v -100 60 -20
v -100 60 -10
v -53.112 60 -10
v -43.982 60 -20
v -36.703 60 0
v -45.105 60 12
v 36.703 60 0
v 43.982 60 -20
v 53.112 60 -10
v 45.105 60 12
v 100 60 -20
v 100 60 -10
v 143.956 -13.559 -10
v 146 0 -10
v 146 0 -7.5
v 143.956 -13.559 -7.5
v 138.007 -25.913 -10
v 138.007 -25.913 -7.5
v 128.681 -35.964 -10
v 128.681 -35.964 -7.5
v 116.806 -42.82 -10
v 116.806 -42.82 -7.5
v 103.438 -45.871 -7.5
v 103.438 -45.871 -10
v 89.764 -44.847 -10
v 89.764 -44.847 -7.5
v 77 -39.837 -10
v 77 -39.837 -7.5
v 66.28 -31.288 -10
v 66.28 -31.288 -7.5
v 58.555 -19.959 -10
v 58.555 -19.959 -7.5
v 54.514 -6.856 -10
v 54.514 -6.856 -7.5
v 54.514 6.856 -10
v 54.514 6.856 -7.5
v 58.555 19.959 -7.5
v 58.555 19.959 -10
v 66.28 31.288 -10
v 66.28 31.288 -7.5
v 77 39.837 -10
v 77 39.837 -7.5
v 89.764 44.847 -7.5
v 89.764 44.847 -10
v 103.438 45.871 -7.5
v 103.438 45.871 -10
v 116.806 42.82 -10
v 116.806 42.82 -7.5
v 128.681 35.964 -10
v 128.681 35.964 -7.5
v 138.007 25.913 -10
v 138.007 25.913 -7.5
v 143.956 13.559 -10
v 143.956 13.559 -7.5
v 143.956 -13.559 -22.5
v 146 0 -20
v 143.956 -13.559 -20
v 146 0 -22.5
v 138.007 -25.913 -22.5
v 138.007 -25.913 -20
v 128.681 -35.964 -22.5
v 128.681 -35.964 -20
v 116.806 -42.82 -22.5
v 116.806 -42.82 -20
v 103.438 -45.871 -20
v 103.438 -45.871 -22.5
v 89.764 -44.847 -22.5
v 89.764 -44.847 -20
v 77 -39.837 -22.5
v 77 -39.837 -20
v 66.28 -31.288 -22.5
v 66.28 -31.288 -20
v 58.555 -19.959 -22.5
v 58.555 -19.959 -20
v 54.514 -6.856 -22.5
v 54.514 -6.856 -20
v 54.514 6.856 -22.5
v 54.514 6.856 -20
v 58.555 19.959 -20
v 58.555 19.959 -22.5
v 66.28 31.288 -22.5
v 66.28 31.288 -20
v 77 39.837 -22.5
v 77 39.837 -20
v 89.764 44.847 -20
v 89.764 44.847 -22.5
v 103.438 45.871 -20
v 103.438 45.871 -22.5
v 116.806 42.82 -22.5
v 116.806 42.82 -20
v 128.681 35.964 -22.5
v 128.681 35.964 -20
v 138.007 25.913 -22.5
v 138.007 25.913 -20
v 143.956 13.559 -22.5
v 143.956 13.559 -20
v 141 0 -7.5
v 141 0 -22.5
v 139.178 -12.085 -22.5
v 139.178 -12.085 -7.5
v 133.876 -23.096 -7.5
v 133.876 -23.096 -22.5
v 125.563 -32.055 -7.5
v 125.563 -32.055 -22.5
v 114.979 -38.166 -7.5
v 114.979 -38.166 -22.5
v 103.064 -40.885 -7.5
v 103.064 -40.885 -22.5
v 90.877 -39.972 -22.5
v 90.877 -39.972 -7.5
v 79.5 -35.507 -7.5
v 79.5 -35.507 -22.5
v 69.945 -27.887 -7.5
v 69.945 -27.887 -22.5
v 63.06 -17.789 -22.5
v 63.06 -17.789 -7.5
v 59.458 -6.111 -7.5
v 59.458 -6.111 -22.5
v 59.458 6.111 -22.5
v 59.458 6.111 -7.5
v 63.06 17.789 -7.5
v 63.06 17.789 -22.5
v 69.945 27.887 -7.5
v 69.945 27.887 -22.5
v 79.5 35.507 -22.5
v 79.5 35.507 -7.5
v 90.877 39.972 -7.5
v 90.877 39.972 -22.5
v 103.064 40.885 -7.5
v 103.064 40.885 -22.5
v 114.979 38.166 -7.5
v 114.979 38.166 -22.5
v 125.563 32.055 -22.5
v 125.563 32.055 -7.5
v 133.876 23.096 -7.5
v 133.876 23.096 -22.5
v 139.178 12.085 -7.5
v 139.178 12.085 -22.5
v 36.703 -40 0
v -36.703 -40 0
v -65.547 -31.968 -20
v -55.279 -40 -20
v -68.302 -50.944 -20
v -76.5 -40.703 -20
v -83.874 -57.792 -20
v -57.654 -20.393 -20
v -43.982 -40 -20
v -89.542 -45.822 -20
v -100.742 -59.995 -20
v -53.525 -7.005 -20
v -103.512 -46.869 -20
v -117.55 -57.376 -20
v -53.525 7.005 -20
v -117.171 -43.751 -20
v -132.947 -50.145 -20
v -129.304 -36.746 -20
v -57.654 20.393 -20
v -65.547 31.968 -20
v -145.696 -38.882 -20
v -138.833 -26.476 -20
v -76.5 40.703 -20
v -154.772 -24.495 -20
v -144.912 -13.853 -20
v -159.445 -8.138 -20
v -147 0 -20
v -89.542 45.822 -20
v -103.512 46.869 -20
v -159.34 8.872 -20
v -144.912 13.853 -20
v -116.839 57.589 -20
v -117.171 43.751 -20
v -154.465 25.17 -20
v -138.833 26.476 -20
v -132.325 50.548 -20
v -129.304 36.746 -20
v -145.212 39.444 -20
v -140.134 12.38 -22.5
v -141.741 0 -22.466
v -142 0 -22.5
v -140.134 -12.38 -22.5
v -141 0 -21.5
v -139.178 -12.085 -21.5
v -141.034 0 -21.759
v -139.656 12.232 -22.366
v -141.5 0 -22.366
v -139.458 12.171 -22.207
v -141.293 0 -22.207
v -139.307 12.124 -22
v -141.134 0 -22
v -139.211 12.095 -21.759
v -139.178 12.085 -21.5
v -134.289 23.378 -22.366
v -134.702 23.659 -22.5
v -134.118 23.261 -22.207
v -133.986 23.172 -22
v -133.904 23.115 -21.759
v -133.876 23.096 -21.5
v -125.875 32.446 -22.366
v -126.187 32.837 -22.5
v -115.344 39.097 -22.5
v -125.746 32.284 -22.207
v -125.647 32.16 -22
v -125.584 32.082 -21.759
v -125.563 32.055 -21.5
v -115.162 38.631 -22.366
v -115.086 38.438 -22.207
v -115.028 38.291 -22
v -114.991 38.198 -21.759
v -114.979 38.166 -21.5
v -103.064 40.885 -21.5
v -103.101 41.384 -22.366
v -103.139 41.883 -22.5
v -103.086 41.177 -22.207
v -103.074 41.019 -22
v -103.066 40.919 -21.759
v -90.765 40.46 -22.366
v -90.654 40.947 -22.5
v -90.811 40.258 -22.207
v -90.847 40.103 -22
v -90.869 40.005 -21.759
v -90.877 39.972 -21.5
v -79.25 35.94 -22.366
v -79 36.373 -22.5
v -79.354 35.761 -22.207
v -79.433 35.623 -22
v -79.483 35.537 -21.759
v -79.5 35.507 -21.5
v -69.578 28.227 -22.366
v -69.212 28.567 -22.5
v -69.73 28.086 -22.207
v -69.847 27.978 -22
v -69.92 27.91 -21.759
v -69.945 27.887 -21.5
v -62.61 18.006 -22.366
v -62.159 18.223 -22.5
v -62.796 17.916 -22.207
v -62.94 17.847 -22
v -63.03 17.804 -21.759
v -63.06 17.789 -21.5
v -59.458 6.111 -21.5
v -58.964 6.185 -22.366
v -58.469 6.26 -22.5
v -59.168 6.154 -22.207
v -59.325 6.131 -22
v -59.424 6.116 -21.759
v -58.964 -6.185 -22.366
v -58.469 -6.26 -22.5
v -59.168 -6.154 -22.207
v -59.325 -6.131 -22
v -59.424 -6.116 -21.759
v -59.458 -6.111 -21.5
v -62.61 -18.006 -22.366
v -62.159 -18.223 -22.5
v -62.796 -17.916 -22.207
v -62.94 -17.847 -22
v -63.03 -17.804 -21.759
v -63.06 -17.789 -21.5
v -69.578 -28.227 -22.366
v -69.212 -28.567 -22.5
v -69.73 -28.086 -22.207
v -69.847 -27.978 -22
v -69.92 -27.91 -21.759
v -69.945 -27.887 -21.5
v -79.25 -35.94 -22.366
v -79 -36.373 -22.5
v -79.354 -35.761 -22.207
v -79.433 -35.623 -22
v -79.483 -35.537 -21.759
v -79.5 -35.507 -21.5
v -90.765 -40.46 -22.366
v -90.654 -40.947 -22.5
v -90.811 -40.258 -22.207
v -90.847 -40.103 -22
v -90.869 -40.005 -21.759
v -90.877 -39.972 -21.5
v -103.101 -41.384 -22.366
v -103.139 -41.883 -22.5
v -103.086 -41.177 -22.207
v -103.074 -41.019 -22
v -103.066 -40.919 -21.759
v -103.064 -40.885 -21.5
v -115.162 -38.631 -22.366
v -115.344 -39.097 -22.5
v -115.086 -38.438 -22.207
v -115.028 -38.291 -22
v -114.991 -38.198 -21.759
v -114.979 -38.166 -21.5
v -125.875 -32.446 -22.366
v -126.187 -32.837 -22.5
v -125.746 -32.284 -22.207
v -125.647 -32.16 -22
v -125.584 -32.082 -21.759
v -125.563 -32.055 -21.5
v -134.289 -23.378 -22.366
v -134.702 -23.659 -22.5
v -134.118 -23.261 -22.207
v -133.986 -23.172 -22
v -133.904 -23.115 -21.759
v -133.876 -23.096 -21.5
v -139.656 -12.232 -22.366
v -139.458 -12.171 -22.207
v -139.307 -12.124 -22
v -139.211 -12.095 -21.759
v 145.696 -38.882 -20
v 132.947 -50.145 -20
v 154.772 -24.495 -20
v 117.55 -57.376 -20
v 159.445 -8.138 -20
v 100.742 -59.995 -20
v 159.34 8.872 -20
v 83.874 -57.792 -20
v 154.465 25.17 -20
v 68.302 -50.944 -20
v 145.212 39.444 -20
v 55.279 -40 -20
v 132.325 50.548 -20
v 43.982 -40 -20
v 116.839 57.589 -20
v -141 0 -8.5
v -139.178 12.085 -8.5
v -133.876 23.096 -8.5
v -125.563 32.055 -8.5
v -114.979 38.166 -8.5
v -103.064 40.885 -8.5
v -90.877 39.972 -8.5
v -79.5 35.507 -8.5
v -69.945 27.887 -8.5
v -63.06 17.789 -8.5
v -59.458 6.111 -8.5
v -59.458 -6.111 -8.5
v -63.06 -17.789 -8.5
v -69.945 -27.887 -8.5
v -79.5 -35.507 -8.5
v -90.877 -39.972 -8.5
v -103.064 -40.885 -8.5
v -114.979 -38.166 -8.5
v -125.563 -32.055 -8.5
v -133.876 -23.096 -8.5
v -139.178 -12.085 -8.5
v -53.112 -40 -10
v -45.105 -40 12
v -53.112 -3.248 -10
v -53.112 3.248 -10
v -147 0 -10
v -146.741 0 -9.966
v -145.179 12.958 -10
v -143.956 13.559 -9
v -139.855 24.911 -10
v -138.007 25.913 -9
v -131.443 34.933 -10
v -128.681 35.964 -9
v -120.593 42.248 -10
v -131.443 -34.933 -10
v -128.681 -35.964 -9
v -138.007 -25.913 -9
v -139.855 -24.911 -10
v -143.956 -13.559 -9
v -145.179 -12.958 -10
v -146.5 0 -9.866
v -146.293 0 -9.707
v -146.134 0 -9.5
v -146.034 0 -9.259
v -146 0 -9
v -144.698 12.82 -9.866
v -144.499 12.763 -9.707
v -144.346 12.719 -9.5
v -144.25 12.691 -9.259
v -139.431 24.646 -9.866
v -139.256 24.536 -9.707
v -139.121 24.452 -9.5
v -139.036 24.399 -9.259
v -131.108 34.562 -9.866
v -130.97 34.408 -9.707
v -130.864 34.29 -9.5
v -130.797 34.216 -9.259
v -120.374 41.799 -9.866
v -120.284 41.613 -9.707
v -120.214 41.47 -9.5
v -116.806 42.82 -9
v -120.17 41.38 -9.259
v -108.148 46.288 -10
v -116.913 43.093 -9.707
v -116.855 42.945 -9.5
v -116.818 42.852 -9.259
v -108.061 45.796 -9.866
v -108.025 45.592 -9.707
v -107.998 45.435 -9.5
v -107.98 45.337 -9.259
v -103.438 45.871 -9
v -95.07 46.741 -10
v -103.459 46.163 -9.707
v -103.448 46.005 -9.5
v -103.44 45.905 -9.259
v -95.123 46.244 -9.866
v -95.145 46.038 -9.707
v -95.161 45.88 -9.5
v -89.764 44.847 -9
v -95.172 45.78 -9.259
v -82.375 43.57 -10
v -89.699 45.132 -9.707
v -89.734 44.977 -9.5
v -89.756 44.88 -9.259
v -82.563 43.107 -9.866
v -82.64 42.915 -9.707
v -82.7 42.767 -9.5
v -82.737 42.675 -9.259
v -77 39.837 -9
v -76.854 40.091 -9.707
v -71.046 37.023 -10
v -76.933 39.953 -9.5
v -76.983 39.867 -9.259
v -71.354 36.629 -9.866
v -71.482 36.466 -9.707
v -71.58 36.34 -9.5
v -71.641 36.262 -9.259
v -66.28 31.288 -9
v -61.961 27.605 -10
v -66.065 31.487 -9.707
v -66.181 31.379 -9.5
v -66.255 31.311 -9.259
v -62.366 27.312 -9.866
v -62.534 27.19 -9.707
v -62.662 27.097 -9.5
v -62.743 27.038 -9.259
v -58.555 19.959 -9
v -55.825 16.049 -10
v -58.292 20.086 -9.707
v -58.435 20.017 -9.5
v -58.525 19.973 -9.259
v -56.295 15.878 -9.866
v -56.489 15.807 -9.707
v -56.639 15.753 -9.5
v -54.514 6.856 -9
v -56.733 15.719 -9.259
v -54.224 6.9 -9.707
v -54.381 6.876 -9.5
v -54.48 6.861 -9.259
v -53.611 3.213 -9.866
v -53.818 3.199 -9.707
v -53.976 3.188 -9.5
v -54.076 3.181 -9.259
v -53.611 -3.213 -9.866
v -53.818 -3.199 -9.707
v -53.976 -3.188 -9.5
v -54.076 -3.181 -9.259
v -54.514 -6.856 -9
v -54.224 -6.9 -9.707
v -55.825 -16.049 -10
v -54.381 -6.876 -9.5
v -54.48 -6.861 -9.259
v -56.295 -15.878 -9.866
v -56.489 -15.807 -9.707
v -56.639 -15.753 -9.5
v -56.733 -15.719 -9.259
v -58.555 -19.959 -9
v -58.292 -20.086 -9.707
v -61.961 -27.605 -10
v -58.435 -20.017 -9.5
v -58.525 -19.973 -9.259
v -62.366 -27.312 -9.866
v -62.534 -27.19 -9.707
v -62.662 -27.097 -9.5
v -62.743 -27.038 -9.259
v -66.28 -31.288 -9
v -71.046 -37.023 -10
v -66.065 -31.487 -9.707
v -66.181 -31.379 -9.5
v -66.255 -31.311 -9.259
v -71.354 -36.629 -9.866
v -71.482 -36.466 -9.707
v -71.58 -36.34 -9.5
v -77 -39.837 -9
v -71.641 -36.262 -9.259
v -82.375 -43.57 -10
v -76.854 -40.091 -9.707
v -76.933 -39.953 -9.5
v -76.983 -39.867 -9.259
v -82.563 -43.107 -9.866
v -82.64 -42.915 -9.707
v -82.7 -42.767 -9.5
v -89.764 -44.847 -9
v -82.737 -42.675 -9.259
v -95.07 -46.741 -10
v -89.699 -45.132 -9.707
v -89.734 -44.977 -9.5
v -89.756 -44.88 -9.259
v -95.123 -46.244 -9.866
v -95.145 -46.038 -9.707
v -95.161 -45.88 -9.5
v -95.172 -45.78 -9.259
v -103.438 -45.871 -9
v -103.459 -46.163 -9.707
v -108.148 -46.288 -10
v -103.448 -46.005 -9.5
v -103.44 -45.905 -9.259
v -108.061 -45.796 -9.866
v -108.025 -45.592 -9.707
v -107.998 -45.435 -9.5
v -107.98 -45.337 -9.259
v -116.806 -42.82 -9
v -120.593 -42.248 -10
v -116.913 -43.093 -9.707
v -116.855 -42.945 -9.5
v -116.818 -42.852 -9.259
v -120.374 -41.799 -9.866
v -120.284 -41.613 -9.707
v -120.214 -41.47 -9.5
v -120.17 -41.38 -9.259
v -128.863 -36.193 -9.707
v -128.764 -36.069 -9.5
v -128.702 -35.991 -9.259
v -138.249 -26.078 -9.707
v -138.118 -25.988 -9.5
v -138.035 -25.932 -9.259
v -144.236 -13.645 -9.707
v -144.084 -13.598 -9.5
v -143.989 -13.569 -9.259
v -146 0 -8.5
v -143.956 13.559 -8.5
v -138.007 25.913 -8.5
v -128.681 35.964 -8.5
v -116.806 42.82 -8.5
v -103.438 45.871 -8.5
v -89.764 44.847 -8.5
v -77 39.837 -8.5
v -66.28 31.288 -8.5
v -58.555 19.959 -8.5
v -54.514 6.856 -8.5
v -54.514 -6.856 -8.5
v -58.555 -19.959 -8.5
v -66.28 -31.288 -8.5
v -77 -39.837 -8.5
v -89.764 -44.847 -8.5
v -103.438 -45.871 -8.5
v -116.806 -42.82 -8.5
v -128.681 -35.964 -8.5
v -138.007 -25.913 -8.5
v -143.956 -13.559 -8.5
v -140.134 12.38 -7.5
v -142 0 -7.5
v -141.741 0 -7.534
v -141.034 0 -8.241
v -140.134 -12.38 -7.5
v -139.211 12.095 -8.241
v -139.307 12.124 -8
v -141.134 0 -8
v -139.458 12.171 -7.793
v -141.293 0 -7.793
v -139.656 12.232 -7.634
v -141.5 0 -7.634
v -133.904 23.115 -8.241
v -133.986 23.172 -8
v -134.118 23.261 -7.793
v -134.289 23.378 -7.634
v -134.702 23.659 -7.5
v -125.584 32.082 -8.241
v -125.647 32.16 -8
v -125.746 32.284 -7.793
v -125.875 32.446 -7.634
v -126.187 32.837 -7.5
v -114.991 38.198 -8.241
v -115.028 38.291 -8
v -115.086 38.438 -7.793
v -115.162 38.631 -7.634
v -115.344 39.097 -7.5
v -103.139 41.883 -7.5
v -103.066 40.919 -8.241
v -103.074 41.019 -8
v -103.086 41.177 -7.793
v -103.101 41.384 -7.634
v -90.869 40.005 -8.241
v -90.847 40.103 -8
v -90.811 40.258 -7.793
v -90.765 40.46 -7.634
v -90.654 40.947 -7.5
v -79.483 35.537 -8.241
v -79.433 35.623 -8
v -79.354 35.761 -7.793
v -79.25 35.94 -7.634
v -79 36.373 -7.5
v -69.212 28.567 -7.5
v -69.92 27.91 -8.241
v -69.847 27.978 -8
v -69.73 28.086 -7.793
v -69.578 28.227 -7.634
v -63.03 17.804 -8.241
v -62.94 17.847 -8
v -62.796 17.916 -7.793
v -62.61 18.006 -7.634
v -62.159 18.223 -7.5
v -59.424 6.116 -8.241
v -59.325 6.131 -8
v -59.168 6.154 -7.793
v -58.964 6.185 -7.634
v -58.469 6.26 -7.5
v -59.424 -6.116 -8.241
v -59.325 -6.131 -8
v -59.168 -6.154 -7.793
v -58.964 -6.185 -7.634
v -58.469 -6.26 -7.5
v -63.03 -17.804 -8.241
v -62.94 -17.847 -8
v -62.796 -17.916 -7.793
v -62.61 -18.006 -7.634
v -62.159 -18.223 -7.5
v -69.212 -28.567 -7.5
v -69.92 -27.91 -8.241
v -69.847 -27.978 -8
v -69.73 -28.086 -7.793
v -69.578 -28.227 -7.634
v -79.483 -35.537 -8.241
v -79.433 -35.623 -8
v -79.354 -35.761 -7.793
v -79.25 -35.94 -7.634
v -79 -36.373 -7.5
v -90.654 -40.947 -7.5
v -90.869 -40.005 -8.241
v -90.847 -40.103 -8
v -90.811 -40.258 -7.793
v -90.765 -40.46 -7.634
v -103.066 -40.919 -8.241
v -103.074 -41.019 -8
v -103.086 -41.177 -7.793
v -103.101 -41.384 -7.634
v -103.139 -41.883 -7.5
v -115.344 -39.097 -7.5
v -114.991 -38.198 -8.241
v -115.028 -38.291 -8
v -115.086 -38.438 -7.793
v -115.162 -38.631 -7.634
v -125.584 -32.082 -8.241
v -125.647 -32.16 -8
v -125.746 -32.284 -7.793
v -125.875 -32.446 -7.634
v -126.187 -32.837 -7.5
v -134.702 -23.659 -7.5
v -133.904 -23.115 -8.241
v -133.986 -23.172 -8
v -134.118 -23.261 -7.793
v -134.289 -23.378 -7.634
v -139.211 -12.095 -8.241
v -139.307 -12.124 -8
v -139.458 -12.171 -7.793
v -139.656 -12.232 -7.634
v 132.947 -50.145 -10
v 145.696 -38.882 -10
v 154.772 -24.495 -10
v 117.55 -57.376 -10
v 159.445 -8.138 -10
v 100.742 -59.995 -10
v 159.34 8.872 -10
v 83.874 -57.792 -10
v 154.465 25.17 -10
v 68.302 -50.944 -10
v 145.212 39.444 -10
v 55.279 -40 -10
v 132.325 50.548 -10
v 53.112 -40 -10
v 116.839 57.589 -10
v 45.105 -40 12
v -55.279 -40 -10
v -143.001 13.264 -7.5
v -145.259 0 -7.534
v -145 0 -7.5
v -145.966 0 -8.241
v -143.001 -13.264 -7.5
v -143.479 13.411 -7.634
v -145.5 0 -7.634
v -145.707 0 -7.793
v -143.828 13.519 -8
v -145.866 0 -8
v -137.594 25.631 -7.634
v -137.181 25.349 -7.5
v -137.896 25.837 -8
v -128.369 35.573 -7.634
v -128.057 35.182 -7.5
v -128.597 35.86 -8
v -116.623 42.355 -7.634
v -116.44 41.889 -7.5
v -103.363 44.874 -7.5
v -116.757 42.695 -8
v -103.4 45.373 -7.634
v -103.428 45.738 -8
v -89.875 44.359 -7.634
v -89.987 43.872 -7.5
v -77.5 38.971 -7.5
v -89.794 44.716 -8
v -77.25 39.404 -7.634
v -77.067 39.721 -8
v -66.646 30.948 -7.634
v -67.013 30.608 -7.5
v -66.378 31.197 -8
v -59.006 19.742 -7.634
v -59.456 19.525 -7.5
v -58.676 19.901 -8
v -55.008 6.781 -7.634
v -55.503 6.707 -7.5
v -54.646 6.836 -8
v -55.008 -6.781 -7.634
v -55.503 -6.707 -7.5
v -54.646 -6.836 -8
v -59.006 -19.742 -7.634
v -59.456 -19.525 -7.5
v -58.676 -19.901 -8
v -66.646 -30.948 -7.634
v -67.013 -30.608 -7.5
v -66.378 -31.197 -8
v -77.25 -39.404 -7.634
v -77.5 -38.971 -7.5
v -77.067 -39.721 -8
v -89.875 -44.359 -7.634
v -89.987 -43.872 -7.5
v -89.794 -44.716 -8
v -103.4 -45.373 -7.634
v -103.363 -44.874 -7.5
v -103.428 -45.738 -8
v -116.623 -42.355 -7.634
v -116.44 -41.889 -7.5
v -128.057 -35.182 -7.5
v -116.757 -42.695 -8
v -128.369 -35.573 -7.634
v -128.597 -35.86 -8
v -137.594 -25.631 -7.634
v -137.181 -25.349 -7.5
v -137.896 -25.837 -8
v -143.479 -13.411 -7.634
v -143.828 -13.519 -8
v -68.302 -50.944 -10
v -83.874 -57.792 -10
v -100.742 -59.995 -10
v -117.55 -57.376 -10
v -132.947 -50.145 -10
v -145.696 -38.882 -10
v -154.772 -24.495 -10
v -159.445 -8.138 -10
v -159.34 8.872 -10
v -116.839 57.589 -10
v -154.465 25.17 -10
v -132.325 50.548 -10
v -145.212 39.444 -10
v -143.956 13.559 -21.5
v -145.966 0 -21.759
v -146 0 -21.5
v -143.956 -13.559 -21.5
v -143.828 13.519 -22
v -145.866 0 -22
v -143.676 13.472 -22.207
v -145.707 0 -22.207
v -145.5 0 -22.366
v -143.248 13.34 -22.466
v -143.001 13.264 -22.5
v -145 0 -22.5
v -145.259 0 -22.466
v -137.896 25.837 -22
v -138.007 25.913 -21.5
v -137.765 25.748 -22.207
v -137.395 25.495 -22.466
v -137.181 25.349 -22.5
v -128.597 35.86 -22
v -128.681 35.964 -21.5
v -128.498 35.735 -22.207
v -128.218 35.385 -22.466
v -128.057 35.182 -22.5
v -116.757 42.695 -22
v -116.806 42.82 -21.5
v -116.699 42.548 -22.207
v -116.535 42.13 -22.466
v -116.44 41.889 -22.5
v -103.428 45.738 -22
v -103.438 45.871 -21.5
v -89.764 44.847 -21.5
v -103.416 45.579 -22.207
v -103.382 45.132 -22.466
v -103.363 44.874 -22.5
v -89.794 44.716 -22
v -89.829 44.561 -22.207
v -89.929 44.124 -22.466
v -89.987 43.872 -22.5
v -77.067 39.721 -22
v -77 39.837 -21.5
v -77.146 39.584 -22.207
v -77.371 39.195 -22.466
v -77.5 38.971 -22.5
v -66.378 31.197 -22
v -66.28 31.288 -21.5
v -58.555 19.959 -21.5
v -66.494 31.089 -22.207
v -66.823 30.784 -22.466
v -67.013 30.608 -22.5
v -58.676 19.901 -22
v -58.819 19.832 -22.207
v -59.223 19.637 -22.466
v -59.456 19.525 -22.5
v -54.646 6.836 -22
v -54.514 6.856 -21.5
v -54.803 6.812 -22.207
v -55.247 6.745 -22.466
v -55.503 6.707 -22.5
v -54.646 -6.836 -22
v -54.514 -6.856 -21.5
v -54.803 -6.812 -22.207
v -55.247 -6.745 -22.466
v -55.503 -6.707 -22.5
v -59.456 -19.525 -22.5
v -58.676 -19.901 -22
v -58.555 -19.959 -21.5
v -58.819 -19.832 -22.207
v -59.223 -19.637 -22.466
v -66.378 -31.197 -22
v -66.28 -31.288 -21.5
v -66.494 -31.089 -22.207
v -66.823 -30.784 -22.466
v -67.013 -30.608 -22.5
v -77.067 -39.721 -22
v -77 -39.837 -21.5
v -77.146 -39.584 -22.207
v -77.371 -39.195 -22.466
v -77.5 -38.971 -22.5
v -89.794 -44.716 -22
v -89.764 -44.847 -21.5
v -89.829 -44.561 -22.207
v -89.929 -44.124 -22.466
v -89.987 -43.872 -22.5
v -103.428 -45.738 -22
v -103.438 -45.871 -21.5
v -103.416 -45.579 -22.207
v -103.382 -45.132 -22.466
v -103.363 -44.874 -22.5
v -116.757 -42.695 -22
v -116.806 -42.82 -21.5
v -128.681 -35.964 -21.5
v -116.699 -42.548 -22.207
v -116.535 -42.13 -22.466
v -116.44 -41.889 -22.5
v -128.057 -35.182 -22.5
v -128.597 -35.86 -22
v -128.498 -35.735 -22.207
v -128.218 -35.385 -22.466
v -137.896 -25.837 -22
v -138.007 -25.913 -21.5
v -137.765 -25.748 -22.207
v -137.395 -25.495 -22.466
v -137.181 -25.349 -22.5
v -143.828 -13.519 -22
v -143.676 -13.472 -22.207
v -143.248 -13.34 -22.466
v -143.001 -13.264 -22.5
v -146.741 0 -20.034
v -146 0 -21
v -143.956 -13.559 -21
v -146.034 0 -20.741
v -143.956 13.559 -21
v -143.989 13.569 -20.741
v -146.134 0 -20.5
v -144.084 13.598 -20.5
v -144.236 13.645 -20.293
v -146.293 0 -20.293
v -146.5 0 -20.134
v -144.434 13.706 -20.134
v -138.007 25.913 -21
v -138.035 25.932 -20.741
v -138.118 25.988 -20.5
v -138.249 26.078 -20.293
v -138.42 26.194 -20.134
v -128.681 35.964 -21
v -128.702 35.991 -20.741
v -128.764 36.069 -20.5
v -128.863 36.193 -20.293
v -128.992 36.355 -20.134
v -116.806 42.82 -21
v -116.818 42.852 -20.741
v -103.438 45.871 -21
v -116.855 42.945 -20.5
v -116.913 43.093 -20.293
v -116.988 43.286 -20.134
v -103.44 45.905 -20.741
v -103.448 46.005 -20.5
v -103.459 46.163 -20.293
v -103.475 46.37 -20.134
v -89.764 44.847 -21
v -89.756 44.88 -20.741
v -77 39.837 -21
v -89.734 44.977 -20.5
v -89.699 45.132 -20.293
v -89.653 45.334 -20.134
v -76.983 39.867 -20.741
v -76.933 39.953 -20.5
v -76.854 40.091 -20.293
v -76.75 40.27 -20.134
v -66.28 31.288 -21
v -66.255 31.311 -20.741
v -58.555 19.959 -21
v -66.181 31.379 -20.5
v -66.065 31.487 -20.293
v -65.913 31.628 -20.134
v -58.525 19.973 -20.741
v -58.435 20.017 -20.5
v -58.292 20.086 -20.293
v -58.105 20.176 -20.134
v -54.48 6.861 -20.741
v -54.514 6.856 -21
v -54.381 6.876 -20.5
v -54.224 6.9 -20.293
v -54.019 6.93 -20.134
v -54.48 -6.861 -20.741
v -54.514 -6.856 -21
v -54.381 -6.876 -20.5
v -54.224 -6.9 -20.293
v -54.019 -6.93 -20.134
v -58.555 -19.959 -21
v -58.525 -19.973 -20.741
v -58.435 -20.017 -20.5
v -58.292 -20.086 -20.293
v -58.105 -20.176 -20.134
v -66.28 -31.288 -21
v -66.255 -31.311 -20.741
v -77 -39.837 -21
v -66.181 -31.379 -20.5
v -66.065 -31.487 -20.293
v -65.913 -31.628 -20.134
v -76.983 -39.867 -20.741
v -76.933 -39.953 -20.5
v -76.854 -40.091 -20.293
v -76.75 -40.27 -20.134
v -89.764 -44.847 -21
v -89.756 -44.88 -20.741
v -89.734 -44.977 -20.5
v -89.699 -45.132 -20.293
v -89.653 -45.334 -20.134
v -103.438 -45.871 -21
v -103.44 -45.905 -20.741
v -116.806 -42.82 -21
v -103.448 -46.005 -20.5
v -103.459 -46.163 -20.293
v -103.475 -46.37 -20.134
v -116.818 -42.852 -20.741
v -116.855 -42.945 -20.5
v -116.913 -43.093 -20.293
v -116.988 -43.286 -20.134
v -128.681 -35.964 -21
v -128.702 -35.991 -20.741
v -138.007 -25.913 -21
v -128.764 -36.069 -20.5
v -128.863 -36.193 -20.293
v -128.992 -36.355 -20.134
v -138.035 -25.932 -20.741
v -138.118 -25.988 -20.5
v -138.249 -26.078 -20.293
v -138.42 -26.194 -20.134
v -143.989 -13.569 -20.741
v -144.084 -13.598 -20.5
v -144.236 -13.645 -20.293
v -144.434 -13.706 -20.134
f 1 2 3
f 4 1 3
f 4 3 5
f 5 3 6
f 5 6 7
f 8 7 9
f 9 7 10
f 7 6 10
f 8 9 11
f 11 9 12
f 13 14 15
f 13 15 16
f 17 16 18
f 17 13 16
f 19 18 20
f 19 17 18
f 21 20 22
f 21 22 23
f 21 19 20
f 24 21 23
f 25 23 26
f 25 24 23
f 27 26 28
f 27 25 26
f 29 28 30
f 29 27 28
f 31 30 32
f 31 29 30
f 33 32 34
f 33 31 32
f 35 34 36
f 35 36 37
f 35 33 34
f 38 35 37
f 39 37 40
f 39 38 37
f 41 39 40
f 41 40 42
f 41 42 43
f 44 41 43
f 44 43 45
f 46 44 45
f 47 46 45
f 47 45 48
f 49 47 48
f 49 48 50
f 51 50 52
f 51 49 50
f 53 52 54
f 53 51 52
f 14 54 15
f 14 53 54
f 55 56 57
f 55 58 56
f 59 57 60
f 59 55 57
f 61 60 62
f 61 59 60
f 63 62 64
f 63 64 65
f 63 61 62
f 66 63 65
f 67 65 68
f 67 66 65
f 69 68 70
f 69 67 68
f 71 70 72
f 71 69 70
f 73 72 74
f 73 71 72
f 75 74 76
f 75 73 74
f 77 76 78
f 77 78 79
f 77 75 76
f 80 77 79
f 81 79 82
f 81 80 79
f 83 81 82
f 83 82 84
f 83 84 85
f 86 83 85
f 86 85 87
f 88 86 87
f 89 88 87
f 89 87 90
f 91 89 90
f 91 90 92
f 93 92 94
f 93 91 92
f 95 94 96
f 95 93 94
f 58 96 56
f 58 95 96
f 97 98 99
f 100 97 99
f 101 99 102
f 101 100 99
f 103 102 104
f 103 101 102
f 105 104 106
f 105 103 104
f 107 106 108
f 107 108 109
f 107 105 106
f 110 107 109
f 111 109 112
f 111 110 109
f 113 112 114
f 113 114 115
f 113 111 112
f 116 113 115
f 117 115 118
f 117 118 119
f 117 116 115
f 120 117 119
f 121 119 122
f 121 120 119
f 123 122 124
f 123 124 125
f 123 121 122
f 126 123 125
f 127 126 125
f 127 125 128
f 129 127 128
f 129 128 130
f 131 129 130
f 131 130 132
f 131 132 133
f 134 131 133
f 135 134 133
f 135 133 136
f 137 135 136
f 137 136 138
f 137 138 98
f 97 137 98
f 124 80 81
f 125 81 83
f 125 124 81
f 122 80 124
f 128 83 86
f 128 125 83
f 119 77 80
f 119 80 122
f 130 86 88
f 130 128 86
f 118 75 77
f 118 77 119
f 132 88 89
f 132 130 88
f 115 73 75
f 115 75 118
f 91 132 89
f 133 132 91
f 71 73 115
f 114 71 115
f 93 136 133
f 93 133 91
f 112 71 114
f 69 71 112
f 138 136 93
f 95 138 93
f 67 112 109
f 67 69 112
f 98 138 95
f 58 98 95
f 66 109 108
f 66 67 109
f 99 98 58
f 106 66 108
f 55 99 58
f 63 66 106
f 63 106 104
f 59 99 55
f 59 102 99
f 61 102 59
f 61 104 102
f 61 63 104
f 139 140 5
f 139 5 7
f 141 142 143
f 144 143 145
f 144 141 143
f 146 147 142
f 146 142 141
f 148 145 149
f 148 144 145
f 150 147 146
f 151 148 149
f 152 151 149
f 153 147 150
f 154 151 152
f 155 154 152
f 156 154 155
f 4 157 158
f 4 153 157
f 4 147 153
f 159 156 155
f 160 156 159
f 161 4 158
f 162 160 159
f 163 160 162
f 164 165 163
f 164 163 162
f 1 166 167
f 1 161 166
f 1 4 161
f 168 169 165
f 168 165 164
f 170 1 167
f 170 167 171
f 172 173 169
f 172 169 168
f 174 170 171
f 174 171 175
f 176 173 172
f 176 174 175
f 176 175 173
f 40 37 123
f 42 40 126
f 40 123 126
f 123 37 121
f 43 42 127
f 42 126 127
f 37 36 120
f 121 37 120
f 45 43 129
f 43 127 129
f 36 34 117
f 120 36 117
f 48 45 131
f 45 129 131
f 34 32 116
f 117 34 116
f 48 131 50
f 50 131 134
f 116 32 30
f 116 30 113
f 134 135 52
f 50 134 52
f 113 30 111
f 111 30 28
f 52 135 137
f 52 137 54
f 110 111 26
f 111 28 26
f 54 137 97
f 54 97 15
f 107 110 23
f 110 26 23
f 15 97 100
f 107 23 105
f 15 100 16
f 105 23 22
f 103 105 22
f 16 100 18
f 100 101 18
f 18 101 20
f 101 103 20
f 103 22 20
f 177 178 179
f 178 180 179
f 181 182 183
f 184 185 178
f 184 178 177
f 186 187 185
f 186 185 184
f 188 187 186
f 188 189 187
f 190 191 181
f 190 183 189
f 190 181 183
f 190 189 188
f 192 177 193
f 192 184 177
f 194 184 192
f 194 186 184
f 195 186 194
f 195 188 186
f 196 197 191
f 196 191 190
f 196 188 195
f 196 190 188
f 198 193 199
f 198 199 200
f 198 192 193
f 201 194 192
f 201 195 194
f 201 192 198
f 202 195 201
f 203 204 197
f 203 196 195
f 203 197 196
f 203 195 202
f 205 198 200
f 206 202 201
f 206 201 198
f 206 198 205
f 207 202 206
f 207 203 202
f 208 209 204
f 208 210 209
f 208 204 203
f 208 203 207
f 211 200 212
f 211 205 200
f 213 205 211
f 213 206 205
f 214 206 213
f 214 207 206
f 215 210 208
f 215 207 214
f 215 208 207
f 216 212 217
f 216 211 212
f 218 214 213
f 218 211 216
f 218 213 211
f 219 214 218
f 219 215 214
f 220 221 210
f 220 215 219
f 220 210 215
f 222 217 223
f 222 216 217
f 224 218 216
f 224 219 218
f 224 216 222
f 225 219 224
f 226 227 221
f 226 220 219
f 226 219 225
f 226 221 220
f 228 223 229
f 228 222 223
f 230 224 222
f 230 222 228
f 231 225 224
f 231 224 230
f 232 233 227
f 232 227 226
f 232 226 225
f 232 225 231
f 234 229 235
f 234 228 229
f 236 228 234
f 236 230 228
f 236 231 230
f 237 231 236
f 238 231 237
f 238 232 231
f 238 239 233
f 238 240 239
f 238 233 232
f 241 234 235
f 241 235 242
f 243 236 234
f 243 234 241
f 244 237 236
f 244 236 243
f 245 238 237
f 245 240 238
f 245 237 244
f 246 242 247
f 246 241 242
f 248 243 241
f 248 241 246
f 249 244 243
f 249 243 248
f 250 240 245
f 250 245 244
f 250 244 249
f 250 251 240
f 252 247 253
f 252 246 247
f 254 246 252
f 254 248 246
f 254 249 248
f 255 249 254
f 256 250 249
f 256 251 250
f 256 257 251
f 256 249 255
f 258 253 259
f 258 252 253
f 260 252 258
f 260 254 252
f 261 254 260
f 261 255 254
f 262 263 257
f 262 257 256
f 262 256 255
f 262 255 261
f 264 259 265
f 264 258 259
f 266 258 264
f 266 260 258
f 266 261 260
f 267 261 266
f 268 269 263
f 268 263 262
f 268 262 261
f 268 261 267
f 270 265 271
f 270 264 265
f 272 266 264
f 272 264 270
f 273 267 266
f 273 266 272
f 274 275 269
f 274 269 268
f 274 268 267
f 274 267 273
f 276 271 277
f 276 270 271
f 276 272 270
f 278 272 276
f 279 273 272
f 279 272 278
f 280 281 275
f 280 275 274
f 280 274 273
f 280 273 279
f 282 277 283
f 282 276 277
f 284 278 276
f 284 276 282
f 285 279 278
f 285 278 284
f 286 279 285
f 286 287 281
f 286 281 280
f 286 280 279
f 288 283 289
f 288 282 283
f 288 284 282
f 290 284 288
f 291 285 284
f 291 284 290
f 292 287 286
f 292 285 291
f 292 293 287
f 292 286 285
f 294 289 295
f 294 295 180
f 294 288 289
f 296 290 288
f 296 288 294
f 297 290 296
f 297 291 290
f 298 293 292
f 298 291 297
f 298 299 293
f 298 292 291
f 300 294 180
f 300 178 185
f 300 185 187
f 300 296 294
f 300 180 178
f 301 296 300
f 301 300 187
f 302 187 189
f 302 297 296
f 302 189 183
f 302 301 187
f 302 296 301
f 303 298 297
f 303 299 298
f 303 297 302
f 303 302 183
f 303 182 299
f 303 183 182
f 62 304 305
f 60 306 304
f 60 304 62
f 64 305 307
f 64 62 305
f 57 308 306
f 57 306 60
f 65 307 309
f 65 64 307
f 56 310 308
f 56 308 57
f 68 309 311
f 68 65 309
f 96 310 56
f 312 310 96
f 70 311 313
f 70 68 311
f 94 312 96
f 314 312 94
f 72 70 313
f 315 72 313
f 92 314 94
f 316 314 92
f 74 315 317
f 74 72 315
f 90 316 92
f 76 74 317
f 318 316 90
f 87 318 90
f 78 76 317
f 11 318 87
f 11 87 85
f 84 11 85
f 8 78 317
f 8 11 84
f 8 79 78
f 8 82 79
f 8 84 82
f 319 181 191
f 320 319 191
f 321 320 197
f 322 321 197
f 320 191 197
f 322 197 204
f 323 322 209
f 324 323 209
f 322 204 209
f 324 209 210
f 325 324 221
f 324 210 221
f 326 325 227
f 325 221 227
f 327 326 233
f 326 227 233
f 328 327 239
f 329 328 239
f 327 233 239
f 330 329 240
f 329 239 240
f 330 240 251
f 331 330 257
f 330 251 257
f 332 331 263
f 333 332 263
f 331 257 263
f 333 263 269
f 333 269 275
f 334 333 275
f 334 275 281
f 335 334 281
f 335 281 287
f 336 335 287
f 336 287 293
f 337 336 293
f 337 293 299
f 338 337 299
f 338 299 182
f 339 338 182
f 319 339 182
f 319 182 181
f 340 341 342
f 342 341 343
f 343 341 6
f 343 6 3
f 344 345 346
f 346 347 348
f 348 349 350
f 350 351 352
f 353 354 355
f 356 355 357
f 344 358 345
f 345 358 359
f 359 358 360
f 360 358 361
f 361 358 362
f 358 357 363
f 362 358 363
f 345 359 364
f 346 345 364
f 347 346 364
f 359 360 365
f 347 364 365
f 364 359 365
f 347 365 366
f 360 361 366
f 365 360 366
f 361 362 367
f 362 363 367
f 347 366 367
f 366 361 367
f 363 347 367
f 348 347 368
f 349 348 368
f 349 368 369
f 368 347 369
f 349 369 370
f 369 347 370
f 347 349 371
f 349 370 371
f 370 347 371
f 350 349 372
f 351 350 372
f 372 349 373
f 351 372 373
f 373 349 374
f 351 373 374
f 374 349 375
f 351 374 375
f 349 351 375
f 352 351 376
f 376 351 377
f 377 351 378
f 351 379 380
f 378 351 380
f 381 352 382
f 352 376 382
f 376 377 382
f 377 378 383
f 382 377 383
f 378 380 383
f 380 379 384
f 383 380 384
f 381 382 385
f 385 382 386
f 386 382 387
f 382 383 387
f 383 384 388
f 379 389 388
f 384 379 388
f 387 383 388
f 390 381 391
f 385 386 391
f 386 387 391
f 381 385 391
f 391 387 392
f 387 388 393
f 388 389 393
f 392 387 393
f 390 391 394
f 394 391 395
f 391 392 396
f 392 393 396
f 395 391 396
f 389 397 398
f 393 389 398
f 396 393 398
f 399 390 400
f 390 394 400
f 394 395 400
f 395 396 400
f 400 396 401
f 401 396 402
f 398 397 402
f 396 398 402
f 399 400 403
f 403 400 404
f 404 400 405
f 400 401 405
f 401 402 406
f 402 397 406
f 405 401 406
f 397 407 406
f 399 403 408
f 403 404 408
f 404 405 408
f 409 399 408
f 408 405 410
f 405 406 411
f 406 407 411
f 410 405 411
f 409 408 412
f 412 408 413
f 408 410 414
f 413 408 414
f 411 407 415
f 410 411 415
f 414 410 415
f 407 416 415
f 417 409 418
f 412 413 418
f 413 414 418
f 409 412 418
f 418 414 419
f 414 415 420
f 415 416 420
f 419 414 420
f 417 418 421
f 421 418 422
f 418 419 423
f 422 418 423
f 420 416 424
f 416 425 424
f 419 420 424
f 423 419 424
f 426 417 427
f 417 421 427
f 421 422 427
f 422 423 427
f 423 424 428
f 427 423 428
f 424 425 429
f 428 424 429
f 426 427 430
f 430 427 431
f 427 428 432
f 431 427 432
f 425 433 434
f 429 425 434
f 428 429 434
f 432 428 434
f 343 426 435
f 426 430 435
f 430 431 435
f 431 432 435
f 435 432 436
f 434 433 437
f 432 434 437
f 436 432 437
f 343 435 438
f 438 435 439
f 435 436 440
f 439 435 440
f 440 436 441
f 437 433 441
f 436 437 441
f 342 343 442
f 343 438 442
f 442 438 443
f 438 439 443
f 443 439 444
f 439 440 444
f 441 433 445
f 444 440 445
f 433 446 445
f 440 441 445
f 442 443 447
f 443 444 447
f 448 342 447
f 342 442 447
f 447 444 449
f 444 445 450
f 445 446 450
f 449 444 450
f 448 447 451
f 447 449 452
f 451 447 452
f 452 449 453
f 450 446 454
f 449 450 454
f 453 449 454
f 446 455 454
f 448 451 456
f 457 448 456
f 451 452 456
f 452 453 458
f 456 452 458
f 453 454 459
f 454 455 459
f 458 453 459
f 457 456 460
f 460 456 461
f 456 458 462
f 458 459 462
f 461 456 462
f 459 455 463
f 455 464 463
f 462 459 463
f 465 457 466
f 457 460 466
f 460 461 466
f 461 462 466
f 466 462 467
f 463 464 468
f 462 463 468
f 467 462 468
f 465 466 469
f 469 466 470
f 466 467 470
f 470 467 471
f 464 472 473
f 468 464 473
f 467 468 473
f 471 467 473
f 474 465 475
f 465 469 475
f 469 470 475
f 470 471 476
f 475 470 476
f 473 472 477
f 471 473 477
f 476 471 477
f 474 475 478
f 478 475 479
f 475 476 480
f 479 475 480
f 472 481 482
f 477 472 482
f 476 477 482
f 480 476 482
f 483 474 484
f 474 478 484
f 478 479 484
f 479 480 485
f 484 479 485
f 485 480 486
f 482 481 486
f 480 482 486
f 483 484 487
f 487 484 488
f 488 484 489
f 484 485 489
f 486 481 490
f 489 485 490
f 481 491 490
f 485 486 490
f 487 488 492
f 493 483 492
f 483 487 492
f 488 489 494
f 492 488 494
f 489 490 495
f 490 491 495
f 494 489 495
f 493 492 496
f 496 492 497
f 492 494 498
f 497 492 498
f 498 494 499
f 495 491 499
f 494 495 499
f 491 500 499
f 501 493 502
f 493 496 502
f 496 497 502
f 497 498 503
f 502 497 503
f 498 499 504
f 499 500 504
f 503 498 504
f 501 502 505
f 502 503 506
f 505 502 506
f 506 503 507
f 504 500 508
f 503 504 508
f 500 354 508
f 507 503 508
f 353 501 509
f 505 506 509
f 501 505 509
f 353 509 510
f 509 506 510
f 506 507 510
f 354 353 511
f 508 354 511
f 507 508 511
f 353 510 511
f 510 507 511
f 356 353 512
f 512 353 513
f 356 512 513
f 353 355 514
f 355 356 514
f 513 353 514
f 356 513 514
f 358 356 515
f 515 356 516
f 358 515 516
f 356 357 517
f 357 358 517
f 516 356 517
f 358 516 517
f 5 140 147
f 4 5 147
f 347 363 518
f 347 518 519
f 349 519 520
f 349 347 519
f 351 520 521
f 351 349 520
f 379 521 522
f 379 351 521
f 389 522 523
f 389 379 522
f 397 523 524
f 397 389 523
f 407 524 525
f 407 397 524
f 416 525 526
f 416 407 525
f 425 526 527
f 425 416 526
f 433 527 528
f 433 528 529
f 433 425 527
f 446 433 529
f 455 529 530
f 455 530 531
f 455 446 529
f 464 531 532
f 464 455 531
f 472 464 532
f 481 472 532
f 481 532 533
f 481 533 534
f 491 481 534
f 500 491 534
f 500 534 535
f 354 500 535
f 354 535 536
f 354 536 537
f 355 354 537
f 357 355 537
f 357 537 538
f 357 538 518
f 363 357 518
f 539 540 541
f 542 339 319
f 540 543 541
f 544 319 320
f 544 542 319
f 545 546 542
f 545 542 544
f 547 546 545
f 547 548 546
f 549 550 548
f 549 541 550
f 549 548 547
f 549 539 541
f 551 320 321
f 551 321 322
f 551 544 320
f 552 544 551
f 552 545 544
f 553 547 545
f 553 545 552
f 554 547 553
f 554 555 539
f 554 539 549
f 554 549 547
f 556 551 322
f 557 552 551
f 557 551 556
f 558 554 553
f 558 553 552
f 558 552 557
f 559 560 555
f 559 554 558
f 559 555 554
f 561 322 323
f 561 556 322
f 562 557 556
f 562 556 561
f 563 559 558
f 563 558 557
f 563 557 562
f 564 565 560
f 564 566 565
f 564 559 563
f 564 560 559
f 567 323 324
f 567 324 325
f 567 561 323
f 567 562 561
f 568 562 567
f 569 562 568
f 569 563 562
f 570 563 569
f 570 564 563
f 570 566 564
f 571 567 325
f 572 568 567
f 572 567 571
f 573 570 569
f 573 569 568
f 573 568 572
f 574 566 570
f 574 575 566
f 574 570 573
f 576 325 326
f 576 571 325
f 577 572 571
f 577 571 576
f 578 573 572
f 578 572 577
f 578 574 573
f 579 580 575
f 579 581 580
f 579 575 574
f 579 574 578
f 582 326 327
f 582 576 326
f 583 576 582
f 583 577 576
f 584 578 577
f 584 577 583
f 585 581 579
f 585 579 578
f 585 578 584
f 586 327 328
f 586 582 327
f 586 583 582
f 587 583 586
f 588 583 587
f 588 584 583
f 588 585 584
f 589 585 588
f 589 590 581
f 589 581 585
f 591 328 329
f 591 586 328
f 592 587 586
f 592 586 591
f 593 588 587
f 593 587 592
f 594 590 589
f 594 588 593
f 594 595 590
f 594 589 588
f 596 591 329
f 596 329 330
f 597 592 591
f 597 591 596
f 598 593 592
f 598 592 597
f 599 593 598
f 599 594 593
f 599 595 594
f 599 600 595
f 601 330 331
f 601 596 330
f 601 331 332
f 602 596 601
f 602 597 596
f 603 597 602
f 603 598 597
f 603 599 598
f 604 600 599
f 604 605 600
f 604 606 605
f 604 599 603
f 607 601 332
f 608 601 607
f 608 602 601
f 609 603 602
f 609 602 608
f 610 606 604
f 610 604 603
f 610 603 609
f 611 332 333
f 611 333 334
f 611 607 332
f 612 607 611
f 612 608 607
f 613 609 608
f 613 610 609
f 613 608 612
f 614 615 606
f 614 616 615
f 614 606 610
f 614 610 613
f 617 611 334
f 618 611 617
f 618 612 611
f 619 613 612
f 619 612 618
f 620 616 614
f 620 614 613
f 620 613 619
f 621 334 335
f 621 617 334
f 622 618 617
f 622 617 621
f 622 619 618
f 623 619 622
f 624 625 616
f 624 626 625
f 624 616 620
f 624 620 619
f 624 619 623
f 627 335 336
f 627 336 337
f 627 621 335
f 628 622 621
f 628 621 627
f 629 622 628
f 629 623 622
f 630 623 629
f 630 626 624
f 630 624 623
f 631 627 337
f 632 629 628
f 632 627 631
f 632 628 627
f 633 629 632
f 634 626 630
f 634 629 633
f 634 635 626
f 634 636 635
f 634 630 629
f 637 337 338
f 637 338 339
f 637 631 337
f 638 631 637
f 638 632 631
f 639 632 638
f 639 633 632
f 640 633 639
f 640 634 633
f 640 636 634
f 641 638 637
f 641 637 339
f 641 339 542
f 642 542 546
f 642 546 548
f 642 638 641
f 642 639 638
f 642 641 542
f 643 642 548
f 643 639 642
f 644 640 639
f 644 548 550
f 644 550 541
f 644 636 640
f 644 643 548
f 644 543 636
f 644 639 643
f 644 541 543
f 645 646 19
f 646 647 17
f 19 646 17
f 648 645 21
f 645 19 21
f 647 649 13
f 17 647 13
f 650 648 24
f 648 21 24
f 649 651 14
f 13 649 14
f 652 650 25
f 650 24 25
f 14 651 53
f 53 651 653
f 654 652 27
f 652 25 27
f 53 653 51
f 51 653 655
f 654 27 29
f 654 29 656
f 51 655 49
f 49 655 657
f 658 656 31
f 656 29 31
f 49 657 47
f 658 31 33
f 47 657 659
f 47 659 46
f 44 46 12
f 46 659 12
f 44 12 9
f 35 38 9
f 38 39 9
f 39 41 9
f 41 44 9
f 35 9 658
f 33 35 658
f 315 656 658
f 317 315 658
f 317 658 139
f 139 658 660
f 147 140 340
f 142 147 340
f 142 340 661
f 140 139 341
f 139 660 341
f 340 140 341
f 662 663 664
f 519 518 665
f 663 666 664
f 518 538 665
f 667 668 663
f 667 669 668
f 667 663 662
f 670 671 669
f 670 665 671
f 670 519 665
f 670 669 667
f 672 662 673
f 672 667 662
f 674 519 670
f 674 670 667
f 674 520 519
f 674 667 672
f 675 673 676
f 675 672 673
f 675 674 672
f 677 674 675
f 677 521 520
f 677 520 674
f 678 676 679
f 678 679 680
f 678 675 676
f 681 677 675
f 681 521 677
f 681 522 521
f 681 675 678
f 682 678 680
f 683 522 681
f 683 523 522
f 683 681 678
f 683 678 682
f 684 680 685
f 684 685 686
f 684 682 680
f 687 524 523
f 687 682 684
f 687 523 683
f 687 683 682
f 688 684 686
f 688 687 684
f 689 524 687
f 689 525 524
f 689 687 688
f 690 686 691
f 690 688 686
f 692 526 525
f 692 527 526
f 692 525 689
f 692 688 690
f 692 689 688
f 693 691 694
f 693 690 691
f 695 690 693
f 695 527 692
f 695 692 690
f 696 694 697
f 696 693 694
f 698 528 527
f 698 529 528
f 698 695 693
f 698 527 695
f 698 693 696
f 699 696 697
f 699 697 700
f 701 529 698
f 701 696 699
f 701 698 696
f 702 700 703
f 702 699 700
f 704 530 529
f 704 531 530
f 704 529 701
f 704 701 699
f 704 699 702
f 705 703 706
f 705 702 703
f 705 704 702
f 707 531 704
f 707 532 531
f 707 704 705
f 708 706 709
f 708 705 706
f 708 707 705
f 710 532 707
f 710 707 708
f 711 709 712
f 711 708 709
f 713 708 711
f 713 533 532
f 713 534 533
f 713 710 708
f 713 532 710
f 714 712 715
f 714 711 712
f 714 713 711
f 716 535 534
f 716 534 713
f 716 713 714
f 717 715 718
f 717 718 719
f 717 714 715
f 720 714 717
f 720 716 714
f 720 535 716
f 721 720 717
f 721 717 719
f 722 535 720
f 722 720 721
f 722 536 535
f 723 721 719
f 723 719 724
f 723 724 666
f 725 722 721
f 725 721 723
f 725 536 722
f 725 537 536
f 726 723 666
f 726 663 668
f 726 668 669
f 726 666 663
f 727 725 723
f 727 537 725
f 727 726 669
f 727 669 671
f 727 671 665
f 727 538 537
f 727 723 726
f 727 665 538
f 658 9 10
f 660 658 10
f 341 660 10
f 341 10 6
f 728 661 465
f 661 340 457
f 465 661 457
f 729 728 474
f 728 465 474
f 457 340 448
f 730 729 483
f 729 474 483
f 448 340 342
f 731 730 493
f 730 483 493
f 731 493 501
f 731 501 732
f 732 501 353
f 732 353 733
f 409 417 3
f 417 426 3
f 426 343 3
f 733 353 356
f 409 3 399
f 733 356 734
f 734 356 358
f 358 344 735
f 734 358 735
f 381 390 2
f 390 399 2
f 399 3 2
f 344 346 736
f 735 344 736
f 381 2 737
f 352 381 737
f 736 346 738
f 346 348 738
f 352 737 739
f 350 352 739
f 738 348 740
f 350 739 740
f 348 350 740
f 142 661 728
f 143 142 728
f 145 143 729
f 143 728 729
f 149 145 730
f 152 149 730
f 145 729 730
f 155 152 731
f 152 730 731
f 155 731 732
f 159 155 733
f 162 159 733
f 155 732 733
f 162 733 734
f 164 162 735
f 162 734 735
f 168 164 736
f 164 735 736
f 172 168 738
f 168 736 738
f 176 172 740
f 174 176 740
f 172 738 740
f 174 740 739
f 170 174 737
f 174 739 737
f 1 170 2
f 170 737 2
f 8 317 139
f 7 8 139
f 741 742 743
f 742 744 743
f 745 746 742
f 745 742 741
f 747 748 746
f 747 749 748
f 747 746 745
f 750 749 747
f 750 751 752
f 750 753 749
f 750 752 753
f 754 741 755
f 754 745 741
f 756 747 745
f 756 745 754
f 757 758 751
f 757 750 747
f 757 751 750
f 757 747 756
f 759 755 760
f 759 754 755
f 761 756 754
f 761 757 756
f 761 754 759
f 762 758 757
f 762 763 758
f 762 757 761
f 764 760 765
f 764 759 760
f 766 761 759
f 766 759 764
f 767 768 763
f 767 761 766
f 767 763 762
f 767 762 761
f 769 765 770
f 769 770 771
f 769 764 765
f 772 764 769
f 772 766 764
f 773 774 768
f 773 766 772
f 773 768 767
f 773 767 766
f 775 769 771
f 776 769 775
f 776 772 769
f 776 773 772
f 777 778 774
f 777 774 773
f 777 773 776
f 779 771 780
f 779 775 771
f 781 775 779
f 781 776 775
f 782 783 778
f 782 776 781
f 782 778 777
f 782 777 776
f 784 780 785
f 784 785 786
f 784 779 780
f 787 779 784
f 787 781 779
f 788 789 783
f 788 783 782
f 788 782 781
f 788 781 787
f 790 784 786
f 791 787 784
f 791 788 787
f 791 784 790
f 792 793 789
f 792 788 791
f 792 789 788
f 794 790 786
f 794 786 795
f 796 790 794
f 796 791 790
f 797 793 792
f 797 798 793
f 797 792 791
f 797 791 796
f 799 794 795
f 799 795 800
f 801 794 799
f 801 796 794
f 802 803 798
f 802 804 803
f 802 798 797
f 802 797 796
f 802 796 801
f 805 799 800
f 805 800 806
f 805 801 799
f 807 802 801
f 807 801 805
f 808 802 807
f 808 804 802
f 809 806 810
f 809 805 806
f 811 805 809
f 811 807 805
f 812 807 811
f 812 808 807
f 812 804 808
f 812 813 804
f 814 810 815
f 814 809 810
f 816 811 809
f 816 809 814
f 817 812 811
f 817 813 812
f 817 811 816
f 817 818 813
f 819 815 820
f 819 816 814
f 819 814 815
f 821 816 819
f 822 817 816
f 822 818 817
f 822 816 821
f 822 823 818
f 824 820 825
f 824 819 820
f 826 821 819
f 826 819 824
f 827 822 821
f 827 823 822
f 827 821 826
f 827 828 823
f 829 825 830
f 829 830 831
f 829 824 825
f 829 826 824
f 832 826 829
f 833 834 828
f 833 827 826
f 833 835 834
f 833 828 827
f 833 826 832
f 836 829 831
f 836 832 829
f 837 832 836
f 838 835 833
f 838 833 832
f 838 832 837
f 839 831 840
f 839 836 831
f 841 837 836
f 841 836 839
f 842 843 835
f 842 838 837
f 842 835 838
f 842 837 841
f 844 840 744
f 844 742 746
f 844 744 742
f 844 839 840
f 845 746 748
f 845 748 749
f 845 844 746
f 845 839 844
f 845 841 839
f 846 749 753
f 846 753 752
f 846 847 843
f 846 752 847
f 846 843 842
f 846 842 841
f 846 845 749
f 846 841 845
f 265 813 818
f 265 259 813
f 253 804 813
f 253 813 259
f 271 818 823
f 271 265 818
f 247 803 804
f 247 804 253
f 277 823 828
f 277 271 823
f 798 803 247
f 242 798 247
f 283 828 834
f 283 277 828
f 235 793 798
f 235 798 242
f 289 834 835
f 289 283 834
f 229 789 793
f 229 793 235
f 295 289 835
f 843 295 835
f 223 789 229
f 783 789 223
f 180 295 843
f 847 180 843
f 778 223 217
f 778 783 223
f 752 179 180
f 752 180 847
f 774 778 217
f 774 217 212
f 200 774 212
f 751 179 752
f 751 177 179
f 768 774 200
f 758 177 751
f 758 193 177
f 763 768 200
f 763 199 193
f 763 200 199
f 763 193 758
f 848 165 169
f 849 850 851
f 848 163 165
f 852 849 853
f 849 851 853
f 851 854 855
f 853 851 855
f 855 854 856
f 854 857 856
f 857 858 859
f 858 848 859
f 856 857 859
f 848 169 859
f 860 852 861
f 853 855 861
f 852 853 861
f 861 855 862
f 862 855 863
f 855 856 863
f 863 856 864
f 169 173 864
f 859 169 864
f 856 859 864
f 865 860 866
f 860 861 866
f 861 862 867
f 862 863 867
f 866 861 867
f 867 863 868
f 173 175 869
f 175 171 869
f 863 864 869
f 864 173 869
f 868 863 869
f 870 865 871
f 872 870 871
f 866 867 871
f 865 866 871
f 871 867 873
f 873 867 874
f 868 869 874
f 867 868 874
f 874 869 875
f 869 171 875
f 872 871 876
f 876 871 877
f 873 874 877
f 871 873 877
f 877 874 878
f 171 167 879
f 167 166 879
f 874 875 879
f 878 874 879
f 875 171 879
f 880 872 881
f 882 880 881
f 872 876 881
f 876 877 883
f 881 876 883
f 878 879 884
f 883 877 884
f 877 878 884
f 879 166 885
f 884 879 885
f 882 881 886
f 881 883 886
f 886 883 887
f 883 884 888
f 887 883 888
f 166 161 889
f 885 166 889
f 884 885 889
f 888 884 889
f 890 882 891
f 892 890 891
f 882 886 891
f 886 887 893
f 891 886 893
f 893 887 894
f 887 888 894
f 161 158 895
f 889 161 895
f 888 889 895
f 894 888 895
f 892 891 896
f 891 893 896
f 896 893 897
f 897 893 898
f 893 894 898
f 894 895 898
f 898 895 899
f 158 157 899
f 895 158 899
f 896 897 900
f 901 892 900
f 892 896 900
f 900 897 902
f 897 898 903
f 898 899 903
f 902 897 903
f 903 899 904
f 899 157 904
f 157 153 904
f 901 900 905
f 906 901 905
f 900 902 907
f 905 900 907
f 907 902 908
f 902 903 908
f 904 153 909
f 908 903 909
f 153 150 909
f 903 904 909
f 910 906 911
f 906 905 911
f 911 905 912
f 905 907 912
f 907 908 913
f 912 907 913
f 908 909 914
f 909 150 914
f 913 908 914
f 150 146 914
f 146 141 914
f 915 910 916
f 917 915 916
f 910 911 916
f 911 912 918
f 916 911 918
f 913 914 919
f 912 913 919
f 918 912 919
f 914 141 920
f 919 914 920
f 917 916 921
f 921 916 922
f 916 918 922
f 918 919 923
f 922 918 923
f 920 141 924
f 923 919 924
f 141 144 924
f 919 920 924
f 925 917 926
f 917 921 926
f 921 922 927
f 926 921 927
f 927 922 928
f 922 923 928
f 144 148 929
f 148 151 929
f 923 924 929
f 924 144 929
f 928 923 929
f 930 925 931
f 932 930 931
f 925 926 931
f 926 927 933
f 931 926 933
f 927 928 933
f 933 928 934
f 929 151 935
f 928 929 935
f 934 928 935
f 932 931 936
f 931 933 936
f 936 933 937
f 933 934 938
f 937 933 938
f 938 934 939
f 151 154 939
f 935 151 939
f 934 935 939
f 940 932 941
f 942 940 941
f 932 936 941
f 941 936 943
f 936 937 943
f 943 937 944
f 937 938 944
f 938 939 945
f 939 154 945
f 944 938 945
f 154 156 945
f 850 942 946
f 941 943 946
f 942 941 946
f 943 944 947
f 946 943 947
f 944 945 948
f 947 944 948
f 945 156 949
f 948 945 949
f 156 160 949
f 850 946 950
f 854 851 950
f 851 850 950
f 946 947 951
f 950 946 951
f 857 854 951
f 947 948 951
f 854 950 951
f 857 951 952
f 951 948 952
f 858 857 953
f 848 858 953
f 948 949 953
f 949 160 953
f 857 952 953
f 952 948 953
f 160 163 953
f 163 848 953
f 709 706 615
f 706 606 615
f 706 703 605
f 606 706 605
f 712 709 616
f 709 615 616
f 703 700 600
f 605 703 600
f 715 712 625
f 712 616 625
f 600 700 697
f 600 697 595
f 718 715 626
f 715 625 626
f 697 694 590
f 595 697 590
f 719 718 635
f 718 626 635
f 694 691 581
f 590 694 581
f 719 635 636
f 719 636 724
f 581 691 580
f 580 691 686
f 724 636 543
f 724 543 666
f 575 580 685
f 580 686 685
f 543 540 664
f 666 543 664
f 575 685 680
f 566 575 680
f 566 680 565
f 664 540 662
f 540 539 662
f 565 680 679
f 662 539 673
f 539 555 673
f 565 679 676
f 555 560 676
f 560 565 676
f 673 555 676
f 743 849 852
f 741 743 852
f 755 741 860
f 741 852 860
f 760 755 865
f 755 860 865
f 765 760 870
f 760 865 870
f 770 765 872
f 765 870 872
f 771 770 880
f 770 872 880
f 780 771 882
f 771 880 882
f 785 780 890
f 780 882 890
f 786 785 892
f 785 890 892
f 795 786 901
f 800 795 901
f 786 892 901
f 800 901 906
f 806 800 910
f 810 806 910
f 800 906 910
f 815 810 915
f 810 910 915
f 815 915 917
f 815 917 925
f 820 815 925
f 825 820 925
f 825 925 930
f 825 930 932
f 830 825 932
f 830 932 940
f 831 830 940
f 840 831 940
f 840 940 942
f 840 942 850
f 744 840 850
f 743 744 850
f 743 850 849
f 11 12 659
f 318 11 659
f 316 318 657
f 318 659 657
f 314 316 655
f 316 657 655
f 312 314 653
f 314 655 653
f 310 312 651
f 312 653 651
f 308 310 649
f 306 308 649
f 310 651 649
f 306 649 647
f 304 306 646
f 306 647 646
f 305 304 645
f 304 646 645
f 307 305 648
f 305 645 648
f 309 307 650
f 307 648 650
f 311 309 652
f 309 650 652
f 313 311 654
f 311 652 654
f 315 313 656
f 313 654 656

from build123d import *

# Parameters (mm, degrees)
SKETCH1_R           = 41
BOSS_EXTRUDE1_DEPTH = 20
CUT_EXTRUDE1_DEPTH  = 102
SKETCH3_R           = 46
SKETCH3_R_2         = 41
BOSS_EXTRUDE2_DEPTH = 7.5
FILLET1_R           = 1


with BuildPart() as part:
    # Sketch1 → Boss-Extrude1 (new, symmetric)
    with BuildSketch(Plane.XY):
        with BuildLine():
            Line((-100, 60), (100, 60))
            ThreePointArc((100, 60), (154.772255751, -24.494897428), (55.27864045, -40))
            Line((55.27864045, -40), (-55.27864045, -40))
            ThreePointArc((-55.27864045, -40), (-154.772255751, -24.494897428), (-100, 60))
        make_face()
        with Locations((100, 0)):
            Circle(SKETCH1_R, mode=Mode.SUBTRACT)
        with Locations(Location((-100, 0, 0), (0, 0, 180))):
            Circle(SKETCH1_R, mode=Mode.SUBTRACT)
    extrude(amount=BOSS_EXTRUDE1_DEPTH, both=True)

    # Sketch2 → Cut-Extrude1 (cut, symmetric)
    with BuildSketch(Plane(origin=(0, 0, 0), x_dir=(1, 0, 0), z_dir=(0, 1, 0))):
        Polygon((0, 0), (-36.702509541, 0), (-43.981914227, 20), (43.981914227, 20), (36.702509541, 0), align=None)
        Polygon((0, -12), (-45.105, -12), (-53.112345154, 10), (-160, 10), (-160, -20), (160, -20), (160, 10), (53.112345154, 10), (45.105, -12), align=None)
    extrude(amount=CUT_EXTRUDE1_DEPTH, both=True, mode=Mode.SUBTRACT)

    # Sketch3 → Boss-Extrude2 (add, symmetric)
    # profile 1 of 2: a face of its own
    with BuildSketch(Plane(origin=(0, 0, -15), x_dir=(-1, 0, 0), z_dir=(0, 0, -1))):
        with Locations((100, 0)):
            Circle(SKETCH3_R)
        with Locations((100, 0)):
            Circle(SKETCH3_R_2, mode=Mode.SUBTRACT)
    # profile 2 of 2: a face of its own
    with BuildSketch(Plane(origin=(0, 0, -15), x_dir=(-1, 0, 0), z_dir=(0, 0, -1))):
        with Locations(Location((-100, 0, 0), (0, 0, 180))):
            Circle(SKETCH3_R)
        with Locations(Location((-100, 0, 0), (0, 0, 180))):
            Circle(SKETCH3_R_2, mode=Mode.SUBTRACT)
    extrude(amount=BOSS_EXTRUDE2_DEPTH, both=True)

    # Fillet1
    # the kernel refuses this fillet: 1 mm, written as the material it adds along each edge
    with BuildSketch(Plane(origin=(-100, 0, -10), x_dir=(-1, 0, 0), z_dir=(0, -1, 0))) as fillet1_piece_1:
        with BuildLine():
            CenterArc((46 + FILLET1_R, -FILLET1_R), FILLET1_R, 90, 90)
            Line((46 + FILLET1_R, 0), (46, 0))
            Line((46, 0), (46, -FILLET1_R))
        make_face()
    revolve(axis=Axis((-100, 0, -10), (0, 0, -1)))
    with BuildSketch(Plane(origin=(-100, 0, -20), x_dir=(-1, 0, 0), z_dir=(0, -1, 0))) as fillet1_piece_2:
        with BuildLine():
            CenterArc((46 + FILLET1_R, FILLET1_R), FILLET1_R, 180, 90)
            Line((46, FILLET1_R), (46, 0))
            Line((46, 0), (46 + FILLET1_R, 0))
        make_face()
    revolve(axis=Axis((-100, 0, -20), (0, 0, -1)))
    # the kernel refuses this fillet: 1 mm, written as the material it takes off along each edge
    with BuildSketch(Plane(origin=(-100, 0, -7.5), x_dir=(-1, 0, 0), z_dir=(0, -1, 0))) as fillet1_2_piece_1:
        with BuildLine():
            CenterArc((46 - FILLET1_R, FILLET1_R), FILLET1_R, 270, 90)
            Line((46 - FILLET1_R, 0), (46, 0))
            Line((46, 0), (46, FILLET1_R))
        make_face()
    revolve(axis=Axis((-100, 0, -7.5), (0, 0, -1)), mode=Mode.SUBTRACT)
    with BuildSketch(Plane(origin=(-100, 0, -22.5), x_dir=(-1, 0, 0), z_dir=(0, -1, 0))) as fillet1_2_piece_2:
        with BuildLine():
            CenterArc((41 + FILLET1_R, -FILLET1_R), FILLET1_R, 90, 90)
            Line((41, -FILLET1_R), (41, 0))
            Line((41, 0), (41 + FILLET1_R, 0))
        make_face()
    revolve(axis=Axis((-100, 0, -22.5), (0, 0, -1)), mode=Mode.SUBTRACT)
    with BuildSketch(Plane(origin=(-100, 0, -22.5), x_dir=(-1, 0, 0), z_dir=(0, -1, 0))) as fillet1_2_piece_3:
        with BuildLine():
            CenterArc((46 - FILLET1_R, -FILLET1_R), FILLET1_R, 0, 90)
            Line((46 - FILLET1_R, 0), (46, 0))
            Line((46, 0), (46, -FILLET1_R))
        make_face()
    revolve(axis=Axis((-100, 0, -22.5), (0, 0, -1)), mode=Mode.SUBTRACT)
    with BuildSketch(Plane(origin=(-100, 0, -7.5), x_dir=(-1, 0, 0), z_dir=(0, -1, 0))) as fillet1_2_piece_4:
        with BuildLine():
            CenterArc((41 + FILLET1_R, FILLET1_R), FILLET1_R, 180, 90)
            Line((41, FILLET1_R), (41, 0))
            Line((41, 0), (41 + FILLET1_R, 0))
        make_face()
    revolve(axis=Axis((-100, 0, -7.5), (0, 0, -1)), mode=Mode.SUBTRACT)


solid = part.part
